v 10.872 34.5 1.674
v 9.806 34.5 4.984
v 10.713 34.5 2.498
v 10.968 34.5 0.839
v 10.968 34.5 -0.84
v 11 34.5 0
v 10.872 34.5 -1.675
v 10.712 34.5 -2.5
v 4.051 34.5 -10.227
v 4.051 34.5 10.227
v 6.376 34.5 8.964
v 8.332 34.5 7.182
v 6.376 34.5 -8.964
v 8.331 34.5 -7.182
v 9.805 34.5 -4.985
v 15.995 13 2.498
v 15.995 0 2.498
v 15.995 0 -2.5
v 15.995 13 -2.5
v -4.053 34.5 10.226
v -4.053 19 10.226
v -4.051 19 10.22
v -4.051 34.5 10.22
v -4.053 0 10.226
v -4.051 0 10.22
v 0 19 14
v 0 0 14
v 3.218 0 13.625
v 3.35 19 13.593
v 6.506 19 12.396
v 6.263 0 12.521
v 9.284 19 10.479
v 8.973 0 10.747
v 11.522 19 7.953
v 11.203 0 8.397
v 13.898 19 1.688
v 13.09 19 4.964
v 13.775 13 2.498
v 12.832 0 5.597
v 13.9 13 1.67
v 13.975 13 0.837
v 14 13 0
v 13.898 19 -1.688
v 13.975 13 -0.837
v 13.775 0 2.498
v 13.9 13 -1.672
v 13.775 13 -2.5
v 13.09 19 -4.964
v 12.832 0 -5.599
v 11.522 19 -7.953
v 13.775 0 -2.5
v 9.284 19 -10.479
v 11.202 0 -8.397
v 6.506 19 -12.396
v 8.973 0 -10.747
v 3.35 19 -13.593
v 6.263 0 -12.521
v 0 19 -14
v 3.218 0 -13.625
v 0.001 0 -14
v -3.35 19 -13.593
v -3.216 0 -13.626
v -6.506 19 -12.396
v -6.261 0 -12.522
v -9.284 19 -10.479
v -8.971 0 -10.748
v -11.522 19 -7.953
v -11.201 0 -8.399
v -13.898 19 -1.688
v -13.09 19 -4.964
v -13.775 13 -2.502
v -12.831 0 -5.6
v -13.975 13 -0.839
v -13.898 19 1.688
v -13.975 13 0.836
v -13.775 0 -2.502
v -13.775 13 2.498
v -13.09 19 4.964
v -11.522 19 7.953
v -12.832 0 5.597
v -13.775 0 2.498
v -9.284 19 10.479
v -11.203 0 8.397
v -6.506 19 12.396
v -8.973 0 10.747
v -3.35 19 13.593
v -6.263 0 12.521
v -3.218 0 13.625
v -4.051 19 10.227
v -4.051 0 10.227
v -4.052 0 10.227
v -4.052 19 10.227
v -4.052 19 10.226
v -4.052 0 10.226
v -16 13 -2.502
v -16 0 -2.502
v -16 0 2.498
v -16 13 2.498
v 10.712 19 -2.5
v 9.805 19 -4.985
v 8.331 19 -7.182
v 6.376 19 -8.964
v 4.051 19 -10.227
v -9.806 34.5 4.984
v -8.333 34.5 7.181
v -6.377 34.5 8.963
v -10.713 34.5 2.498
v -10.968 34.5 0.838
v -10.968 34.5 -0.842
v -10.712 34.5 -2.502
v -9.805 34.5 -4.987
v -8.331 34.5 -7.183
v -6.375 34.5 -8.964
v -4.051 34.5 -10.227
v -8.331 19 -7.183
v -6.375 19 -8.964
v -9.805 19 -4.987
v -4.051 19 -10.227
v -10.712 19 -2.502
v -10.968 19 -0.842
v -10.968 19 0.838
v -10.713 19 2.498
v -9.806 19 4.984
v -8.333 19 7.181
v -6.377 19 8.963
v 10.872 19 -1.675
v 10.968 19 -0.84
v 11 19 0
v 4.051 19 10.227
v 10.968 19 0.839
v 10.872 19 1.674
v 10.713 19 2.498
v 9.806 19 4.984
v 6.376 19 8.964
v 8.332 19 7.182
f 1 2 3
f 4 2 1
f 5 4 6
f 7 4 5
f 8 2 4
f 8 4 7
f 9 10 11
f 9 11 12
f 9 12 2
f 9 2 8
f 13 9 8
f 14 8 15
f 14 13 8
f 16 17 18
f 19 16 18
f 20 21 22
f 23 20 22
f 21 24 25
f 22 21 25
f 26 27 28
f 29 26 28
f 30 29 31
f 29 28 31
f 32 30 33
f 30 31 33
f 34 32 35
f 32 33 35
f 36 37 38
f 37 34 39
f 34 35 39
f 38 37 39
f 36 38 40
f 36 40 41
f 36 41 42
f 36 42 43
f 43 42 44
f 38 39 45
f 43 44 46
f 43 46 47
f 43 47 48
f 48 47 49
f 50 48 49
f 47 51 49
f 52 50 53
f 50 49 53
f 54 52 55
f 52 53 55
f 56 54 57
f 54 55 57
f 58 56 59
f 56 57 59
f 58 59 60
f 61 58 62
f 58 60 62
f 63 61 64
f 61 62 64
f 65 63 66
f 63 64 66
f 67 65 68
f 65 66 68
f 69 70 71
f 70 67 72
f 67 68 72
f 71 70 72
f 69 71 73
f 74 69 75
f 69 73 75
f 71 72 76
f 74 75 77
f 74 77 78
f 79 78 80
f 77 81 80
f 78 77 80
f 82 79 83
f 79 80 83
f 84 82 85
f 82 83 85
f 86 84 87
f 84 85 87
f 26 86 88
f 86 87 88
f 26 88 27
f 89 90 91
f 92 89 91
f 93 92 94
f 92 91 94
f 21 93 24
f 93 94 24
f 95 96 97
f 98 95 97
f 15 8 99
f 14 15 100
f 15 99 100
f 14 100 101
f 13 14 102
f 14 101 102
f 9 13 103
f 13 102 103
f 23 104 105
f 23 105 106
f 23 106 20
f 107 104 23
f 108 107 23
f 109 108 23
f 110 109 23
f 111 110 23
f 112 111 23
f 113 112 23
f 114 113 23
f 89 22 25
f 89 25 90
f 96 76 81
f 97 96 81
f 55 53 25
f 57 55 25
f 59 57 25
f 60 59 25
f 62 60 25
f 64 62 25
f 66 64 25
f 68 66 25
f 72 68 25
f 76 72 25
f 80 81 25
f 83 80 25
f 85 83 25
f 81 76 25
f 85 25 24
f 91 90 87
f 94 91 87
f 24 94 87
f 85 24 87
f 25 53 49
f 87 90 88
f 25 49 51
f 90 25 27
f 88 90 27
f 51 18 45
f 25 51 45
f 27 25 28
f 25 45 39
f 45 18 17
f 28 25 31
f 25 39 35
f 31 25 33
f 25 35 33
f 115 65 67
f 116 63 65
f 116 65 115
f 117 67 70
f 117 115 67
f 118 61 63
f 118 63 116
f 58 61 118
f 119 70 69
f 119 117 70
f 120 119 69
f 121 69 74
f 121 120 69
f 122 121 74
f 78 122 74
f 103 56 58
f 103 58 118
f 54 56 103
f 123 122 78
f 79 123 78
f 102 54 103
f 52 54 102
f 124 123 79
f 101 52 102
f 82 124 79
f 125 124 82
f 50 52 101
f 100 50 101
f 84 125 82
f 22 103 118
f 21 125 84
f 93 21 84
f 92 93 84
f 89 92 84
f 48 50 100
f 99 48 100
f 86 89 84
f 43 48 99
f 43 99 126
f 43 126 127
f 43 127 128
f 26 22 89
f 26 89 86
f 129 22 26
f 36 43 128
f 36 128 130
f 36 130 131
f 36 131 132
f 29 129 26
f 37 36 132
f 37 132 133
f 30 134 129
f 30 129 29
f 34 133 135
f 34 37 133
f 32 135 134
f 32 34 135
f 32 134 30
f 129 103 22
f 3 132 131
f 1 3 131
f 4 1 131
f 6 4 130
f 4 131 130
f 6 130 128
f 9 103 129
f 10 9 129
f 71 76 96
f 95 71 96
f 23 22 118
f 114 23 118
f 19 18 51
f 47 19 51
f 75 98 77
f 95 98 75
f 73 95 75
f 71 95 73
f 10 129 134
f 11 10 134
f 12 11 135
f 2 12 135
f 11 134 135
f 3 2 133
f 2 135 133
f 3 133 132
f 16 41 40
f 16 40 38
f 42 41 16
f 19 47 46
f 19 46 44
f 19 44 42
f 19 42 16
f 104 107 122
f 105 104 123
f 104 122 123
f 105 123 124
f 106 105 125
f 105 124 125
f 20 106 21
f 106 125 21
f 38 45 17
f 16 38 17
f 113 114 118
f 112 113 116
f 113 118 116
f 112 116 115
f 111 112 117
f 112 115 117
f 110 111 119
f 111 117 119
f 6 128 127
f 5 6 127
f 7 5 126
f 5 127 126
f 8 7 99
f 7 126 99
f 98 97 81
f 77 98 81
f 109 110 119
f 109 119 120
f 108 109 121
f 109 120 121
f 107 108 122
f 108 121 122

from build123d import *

# Parameters (mm, degrees)
BOSS_EXTRUDE1_DEPTH   = 34.5
BOSS_EXTRUDE1_2_DEPTH = 34.5
SKETCH1_4_R           = 14
BOSS_EXTRUDE2_DEPTH   = 19
BOSS_EXTRUDE3_DEPTH   = 13


with BuildPart() as part:
    # Sketch1 → Boss-Extrude1 (new body)
    with BuildSketch(Plane(origin=(0, 0, 0), x_dir=(1, 0, 0), z_dir=(0, 1, 0))):
        with BuildLine():
            Line((-4.053189053, -10.226028173), (-4.050853741, -10.220136277))
            Line((-4.050853741, -10.220136277), (-4.050853741, 10.226953489))
            ThreePointArc((-4.050853741, 10.226953489), (-10.999999641, 0.001255975), (-4.053189053, -10.226028173))
        make_face()
    extrude(amount=BOSS_EXTRUDE1_DEPTH)



with BuildPart() as body_2:
    # Sketch1 → Boss-Extrude1 2 (new body)
    with BuildSketch(Plane(origin=(0, 0, 0), x_dir=(1, 0, 0), z_dir=(0, 1, 0))):
        with BuildLine():
            ThreePointArc((4.050853741, -10.226953489), (10.999999713, 0), (4.050853741, 10.226953489))
            Line((4.050853741, 10.226953489), (4.050853741, -10.226953489))
        make_face()
    extrude(amount=BOSS_EXTRUDE1_2_DEPTH)


with BuildPart() as part_1:
    add(part.part)

    add(body_2.part)  # Boss-Extrude2 merges body 2
    # Sketch1<4> → Boss-Extrude2 (add)
    with BuildSketch(Plane(origin=(0, 0, 0), x_dir=(1, 0, 0), z_dir=(0, 1, 0))):
        Circle(SKETCH1_4_R)
        with BuildLine():
            Line((-4.050853741, -10.220136277), (-4.050853741, -10.226953489))
            ThreePointArc((-4.050853741, -10.226953489), (-10.999999713, 0), (-4.050853741, 10.226953489))
            Line((-4.050853741, 10.226953489), (-4.050853741, 2.501755217))
            Line((-4.050853741, 2.501755217), (-4.050853741, -10.220136277))
        make_face(mode=Mode.SUBTRACT)
        with BuildLine():
            Line((4.050853741, -10.226953489), (4.050853741, 2.5))
            Line((4.050853741, 2.5), (4.050853741, 10.226953489))
            ThreePointArc((4.050853741, 10.226953489), (10.999999713, 0), (4.050853741, -10.226953489))
        make_face(mode=Mode.SUBTRACT)
    extrude(amount=BOSS_EXTRUDE2_DEPTH)

    # Sketch1<5> → Boss-Extrude3 (add)
    with BuildSketch(Plane(origin=(0, 0, 0), x_dir=(1, 0, 0), z_dir=(0, 1, 0))):
        with BuildLine():
            Line((-16, -2.498244783), (-13.77529575, -2.498244783))
            ThreePointArc((-13.77529575, -2.498244783), (-13.999999886, 0.001783889), (-13.774658647, 2.501755217))
            Line((-13.774658647, 2.501755217), (-16, 2.501755217))
            Line((-16, 2.501755217), (-16, -2.498244783))
        make_face()
        with BuildLine():
            ThreePointArc((13.774977314, 2.5), (13.999999972, 0.000891934), (13.77529575, -2.498244783))
            Line((13.77529575, -2.498244783), (15.995322261, -2.498244783))
            Line((15.995322261, -2.498244783), (15.995322261, 2.5))
            Line((15.995322261, 2.5), (13.774977314, 2.5))
        make_face()
    extrude(amount=BOSS_EXTRUDE3_DEPTH)


solid = part_1.part
